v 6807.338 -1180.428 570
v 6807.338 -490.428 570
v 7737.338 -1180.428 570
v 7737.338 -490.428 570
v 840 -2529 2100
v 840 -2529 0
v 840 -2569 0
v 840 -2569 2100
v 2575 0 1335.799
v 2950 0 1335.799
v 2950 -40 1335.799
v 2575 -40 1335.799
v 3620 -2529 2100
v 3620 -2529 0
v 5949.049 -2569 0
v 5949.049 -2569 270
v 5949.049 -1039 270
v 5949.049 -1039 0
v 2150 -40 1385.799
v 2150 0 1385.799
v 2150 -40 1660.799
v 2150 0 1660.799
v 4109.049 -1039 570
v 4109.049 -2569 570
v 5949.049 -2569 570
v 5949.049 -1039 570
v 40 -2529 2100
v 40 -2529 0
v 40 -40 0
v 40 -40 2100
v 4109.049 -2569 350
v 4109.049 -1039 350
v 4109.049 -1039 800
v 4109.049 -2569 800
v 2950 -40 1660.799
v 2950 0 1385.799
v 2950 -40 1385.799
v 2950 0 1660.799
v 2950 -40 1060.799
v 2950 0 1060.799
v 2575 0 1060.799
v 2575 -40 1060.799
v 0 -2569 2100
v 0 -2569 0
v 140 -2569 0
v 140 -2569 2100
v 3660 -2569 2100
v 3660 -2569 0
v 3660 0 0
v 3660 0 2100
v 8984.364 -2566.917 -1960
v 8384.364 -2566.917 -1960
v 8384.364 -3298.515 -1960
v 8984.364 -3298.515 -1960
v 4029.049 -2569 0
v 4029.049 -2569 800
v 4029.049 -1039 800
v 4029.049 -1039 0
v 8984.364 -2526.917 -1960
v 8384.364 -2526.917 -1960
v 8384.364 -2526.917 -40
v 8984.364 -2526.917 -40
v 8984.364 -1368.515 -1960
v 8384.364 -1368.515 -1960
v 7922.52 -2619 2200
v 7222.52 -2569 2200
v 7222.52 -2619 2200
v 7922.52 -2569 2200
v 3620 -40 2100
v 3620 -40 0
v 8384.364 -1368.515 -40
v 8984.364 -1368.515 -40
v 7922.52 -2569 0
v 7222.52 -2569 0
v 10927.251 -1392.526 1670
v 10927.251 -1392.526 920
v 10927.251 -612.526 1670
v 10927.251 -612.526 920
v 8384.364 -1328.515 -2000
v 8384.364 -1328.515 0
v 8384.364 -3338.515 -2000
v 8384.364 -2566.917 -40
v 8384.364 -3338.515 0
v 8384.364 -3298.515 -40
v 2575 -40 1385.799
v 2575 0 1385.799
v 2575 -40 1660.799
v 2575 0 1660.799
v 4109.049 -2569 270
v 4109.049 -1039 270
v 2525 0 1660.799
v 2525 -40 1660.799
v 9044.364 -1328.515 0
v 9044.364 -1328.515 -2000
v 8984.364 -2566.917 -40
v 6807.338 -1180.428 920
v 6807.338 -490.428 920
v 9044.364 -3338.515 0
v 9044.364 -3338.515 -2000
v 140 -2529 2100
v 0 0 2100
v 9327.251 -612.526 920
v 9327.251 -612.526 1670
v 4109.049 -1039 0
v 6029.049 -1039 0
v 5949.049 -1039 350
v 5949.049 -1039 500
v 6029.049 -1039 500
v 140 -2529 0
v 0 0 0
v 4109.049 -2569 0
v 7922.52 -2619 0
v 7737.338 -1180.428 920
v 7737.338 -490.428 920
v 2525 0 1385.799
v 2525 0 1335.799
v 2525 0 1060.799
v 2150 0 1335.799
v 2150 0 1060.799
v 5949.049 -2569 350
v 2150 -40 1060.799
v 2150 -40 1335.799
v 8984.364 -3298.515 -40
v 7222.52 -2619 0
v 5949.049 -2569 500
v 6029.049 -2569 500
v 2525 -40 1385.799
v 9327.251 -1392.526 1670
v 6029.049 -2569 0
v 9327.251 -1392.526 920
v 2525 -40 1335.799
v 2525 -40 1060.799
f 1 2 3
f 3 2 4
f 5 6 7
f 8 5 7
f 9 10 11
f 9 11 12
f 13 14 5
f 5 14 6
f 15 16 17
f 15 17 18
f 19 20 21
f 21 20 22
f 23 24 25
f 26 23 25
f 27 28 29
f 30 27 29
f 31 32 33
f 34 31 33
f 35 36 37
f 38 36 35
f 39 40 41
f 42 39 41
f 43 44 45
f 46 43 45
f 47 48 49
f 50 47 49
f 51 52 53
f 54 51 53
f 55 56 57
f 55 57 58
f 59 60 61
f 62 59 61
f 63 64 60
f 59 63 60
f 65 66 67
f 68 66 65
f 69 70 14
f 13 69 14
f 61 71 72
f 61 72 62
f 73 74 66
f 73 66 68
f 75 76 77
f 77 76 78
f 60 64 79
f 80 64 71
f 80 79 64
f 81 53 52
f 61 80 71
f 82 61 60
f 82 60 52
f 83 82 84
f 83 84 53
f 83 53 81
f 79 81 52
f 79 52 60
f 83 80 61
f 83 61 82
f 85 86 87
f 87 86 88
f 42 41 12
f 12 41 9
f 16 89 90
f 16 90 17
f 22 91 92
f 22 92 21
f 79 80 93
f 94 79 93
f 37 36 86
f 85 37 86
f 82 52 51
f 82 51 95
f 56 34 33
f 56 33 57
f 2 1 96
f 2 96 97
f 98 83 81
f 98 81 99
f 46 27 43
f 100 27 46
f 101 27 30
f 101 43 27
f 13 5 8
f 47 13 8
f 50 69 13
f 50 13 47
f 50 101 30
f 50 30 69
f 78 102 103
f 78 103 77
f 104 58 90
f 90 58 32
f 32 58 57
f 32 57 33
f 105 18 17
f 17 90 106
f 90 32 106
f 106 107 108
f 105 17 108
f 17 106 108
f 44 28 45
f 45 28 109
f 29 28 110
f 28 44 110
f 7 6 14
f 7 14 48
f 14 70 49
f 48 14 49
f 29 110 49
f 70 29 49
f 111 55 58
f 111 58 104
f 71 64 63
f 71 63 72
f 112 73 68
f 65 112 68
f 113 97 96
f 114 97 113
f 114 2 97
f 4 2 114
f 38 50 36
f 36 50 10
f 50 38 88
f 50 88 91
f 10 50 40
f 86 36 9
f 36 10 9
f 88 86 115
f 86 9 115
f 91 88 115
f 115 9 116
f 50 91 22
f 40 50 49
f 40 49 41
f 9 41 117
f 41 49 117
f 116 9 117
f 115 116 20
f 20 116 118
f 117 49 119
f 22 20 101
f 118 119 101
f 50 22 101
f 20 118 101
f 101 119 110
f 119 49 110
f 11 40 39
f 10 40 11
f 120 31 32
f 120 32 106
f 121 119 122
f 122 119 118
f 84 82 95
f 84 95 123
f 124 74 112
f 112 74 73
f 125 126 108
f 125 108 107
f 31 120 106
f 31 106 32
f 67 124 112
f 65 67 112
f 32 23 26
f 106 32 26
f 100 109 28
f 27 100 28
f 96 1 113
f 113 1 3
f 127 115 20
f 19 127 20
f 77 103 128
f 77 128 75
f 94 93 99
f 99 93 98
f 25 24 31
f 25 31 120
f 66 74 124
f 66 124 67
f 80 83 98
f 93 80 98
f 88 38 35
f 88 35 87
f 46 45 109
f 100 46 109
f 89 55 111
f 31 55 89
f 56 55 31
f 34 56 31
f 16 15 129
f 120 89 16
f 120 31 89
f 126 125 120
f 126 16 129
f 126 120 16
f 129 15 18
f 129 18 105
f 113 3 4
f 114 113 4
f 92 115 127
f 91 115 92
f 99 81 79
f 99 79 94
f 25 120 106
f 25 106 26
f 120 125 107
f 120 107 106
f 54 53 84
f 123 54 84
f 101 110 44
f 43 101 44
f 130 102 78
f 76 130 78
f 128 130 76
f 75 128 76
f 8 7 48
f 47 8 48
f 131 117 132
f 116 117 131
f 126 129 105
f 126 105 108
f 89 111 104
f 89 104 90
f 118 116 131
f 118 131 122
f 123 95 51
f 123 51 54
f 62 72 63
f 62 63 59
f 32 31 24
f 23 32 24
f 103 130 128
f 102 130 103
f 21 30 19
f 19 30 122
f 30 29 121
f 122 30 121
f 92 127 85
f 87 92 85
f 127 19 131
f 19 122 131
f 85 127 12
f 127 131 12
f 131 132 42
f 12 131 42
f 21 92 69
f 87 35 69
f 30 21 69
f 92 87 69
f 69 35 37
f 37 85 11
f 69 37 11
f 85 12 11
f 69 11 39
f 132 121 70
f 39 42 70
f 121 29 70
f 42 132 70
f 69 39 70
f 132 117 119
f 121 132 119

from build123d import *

# Parameters (mm, degrees)
F1_DEPTH  = 2100
F3_DEPTH  = 1530
F4_W      = 700
F4_H      = 2200
F5_DEPTH  = 50
F6_W      = 375
F6_H      = 275
F7_DEPTH  = 100
F8_W      = 660
F8_H      = 2010
F9_DEPTH  = 2000
F10_W     = 1158.402189
F10_H     = 1920.000002
F10_W_2   = 731.597813
F11_DEPTH = 600
F12_W     = 1840
F12_H     = 220
F13_DEPTH = 1530
F14_W     = 930
F14_H     = 690
F15_DEPTH = 350
F16_W     = 1600
F16_H     = 780
F17_DEPTH = 750


with BuildPart() as f1:
    # F0 (on Top) → F1 (new body)
    with BuildSketch(Plane.XY):
        Polygon((39.99995, -2528.99995), (39.99995, -39.99995), (3619.99995, -39.99995), (3619.99995, -2528.99995), (839.99995, -2528.99995), (839.99995, -2568.999901), (3659.999901, -2568.999901), (3659.999901, 0), (0, 0), (0, -2568.999901), (139.99995, -2568.999901), (139.99995, -2528.99995), align=None)
    extrude(amount=F1_DEPTH)

    # F6 (on face) → F7 (cut)
    with BuildSketch(Plane(origin=(0, 0, 0), x_dir=(-1, 0, 0), z_dir=(0, 1, 0))):
        with Locations((-2762.49995, 1523.298931)):
            Rectangle(F6_W, F6_H)
        with Locations((-2337.49995, 1523.298931)):
            Rectangle(F6_W, F6_H)
        with Locations((-2762.49995, 1198.298931)):
            Rectangle(F6_W, F6_H)
        with Locations((-2337.49995, 1198.298931)):
            Rectangle(F6_W, F6_H)
    extrude(amount=-F7_DEPTH, mode=Mode.SUBTRACT)


with BuildPart() as f3:
    # F2 (on face) → F3 (new body)
    with BuildSketch(Plane.XZ.offset(2568.999901)):
        Polygon((4109.049003, 800), (4029.049003, 800), (4029.049003, 0), (4109.049003, 0), (4109.049003, 270), (5949.049003, 270), (5949.049003, 0), (6029.049003, 0), (6029.049003, 500), (5949.049003, 500), (5949.049003, 350), (4109.049003, 350), align=None)
    extrude(amount=-F3_DEPTH)


with BuildPart() as f5:
    # F4 (on face) → F5 (new body)
    with BuildSketch(Plane.XZ.offset(2568.999901)):
        with Locations((7572.520119, 1100)):
            Rectangle(F4_W, F4_H)
    extrude(amount=F5_DEPTH)


with BuildPart() as f9:
    # F8 (on face) → F9 (new body)
    with BuildSketch(Plane(origin=(0, 0, 0), x_dir=(1, 0, 0), z_dir=(0, 0, -1))):
        with Locations((8714.363651, 2333.515091)):
            Rectangle(F8_W, F8_H)
    extrude(amount=F9_DEPTH)

    # F10 (on face) → F11 (cut)
    with BuildSketch(Plane(origin=(8384.363651, 0, 0), x_dir=(0, -1, 0), z_dir=(-1, 0, 0))):
        with Locations((1947.716184, -1000)):
            Rectangle(F10_W, F10_H)
        with Locations((2932.716185, -1000)):
            Rectangle(F10_W_2, F10_H)
    extrude(amount=-F11_DEPTH, mode=Mode.SUBTRACT)


with BuildPart() as f13:
    # F12 (on face) → F13 (new body, through all)
    with BuildSketch(Plane.XZ.offset(2568.999901)):
        with Locations((5029.049003, 460)):
            Rectangle(F12_W, F12_H)
    extrude(amount=-F13_DEPTH)


with BuildPart() as f15:
    # F14 (on face) → F15 (new body)
    with BuildSketch(Plane.XY.offset(570)):
        with Locations((7272.338333, -835.427744)):
            Rectangle(F14_W, F14_H)
    extrude(amount=F15_DEPTH)


with BuildPart() as f17:
    # F16 (on face) → F17 (new body)
    with BuildSketch(Plane.XY.offset(920)):
        with Locations((10127.251396, -1002.525995)):
            Rectangle(F16_W, F16_H)
    extrude(amount=F17_DEPTH)


solid = Compound([f1.part, f3.part, f5.part, f9.part, f13.part, f15.part, f17.part])
